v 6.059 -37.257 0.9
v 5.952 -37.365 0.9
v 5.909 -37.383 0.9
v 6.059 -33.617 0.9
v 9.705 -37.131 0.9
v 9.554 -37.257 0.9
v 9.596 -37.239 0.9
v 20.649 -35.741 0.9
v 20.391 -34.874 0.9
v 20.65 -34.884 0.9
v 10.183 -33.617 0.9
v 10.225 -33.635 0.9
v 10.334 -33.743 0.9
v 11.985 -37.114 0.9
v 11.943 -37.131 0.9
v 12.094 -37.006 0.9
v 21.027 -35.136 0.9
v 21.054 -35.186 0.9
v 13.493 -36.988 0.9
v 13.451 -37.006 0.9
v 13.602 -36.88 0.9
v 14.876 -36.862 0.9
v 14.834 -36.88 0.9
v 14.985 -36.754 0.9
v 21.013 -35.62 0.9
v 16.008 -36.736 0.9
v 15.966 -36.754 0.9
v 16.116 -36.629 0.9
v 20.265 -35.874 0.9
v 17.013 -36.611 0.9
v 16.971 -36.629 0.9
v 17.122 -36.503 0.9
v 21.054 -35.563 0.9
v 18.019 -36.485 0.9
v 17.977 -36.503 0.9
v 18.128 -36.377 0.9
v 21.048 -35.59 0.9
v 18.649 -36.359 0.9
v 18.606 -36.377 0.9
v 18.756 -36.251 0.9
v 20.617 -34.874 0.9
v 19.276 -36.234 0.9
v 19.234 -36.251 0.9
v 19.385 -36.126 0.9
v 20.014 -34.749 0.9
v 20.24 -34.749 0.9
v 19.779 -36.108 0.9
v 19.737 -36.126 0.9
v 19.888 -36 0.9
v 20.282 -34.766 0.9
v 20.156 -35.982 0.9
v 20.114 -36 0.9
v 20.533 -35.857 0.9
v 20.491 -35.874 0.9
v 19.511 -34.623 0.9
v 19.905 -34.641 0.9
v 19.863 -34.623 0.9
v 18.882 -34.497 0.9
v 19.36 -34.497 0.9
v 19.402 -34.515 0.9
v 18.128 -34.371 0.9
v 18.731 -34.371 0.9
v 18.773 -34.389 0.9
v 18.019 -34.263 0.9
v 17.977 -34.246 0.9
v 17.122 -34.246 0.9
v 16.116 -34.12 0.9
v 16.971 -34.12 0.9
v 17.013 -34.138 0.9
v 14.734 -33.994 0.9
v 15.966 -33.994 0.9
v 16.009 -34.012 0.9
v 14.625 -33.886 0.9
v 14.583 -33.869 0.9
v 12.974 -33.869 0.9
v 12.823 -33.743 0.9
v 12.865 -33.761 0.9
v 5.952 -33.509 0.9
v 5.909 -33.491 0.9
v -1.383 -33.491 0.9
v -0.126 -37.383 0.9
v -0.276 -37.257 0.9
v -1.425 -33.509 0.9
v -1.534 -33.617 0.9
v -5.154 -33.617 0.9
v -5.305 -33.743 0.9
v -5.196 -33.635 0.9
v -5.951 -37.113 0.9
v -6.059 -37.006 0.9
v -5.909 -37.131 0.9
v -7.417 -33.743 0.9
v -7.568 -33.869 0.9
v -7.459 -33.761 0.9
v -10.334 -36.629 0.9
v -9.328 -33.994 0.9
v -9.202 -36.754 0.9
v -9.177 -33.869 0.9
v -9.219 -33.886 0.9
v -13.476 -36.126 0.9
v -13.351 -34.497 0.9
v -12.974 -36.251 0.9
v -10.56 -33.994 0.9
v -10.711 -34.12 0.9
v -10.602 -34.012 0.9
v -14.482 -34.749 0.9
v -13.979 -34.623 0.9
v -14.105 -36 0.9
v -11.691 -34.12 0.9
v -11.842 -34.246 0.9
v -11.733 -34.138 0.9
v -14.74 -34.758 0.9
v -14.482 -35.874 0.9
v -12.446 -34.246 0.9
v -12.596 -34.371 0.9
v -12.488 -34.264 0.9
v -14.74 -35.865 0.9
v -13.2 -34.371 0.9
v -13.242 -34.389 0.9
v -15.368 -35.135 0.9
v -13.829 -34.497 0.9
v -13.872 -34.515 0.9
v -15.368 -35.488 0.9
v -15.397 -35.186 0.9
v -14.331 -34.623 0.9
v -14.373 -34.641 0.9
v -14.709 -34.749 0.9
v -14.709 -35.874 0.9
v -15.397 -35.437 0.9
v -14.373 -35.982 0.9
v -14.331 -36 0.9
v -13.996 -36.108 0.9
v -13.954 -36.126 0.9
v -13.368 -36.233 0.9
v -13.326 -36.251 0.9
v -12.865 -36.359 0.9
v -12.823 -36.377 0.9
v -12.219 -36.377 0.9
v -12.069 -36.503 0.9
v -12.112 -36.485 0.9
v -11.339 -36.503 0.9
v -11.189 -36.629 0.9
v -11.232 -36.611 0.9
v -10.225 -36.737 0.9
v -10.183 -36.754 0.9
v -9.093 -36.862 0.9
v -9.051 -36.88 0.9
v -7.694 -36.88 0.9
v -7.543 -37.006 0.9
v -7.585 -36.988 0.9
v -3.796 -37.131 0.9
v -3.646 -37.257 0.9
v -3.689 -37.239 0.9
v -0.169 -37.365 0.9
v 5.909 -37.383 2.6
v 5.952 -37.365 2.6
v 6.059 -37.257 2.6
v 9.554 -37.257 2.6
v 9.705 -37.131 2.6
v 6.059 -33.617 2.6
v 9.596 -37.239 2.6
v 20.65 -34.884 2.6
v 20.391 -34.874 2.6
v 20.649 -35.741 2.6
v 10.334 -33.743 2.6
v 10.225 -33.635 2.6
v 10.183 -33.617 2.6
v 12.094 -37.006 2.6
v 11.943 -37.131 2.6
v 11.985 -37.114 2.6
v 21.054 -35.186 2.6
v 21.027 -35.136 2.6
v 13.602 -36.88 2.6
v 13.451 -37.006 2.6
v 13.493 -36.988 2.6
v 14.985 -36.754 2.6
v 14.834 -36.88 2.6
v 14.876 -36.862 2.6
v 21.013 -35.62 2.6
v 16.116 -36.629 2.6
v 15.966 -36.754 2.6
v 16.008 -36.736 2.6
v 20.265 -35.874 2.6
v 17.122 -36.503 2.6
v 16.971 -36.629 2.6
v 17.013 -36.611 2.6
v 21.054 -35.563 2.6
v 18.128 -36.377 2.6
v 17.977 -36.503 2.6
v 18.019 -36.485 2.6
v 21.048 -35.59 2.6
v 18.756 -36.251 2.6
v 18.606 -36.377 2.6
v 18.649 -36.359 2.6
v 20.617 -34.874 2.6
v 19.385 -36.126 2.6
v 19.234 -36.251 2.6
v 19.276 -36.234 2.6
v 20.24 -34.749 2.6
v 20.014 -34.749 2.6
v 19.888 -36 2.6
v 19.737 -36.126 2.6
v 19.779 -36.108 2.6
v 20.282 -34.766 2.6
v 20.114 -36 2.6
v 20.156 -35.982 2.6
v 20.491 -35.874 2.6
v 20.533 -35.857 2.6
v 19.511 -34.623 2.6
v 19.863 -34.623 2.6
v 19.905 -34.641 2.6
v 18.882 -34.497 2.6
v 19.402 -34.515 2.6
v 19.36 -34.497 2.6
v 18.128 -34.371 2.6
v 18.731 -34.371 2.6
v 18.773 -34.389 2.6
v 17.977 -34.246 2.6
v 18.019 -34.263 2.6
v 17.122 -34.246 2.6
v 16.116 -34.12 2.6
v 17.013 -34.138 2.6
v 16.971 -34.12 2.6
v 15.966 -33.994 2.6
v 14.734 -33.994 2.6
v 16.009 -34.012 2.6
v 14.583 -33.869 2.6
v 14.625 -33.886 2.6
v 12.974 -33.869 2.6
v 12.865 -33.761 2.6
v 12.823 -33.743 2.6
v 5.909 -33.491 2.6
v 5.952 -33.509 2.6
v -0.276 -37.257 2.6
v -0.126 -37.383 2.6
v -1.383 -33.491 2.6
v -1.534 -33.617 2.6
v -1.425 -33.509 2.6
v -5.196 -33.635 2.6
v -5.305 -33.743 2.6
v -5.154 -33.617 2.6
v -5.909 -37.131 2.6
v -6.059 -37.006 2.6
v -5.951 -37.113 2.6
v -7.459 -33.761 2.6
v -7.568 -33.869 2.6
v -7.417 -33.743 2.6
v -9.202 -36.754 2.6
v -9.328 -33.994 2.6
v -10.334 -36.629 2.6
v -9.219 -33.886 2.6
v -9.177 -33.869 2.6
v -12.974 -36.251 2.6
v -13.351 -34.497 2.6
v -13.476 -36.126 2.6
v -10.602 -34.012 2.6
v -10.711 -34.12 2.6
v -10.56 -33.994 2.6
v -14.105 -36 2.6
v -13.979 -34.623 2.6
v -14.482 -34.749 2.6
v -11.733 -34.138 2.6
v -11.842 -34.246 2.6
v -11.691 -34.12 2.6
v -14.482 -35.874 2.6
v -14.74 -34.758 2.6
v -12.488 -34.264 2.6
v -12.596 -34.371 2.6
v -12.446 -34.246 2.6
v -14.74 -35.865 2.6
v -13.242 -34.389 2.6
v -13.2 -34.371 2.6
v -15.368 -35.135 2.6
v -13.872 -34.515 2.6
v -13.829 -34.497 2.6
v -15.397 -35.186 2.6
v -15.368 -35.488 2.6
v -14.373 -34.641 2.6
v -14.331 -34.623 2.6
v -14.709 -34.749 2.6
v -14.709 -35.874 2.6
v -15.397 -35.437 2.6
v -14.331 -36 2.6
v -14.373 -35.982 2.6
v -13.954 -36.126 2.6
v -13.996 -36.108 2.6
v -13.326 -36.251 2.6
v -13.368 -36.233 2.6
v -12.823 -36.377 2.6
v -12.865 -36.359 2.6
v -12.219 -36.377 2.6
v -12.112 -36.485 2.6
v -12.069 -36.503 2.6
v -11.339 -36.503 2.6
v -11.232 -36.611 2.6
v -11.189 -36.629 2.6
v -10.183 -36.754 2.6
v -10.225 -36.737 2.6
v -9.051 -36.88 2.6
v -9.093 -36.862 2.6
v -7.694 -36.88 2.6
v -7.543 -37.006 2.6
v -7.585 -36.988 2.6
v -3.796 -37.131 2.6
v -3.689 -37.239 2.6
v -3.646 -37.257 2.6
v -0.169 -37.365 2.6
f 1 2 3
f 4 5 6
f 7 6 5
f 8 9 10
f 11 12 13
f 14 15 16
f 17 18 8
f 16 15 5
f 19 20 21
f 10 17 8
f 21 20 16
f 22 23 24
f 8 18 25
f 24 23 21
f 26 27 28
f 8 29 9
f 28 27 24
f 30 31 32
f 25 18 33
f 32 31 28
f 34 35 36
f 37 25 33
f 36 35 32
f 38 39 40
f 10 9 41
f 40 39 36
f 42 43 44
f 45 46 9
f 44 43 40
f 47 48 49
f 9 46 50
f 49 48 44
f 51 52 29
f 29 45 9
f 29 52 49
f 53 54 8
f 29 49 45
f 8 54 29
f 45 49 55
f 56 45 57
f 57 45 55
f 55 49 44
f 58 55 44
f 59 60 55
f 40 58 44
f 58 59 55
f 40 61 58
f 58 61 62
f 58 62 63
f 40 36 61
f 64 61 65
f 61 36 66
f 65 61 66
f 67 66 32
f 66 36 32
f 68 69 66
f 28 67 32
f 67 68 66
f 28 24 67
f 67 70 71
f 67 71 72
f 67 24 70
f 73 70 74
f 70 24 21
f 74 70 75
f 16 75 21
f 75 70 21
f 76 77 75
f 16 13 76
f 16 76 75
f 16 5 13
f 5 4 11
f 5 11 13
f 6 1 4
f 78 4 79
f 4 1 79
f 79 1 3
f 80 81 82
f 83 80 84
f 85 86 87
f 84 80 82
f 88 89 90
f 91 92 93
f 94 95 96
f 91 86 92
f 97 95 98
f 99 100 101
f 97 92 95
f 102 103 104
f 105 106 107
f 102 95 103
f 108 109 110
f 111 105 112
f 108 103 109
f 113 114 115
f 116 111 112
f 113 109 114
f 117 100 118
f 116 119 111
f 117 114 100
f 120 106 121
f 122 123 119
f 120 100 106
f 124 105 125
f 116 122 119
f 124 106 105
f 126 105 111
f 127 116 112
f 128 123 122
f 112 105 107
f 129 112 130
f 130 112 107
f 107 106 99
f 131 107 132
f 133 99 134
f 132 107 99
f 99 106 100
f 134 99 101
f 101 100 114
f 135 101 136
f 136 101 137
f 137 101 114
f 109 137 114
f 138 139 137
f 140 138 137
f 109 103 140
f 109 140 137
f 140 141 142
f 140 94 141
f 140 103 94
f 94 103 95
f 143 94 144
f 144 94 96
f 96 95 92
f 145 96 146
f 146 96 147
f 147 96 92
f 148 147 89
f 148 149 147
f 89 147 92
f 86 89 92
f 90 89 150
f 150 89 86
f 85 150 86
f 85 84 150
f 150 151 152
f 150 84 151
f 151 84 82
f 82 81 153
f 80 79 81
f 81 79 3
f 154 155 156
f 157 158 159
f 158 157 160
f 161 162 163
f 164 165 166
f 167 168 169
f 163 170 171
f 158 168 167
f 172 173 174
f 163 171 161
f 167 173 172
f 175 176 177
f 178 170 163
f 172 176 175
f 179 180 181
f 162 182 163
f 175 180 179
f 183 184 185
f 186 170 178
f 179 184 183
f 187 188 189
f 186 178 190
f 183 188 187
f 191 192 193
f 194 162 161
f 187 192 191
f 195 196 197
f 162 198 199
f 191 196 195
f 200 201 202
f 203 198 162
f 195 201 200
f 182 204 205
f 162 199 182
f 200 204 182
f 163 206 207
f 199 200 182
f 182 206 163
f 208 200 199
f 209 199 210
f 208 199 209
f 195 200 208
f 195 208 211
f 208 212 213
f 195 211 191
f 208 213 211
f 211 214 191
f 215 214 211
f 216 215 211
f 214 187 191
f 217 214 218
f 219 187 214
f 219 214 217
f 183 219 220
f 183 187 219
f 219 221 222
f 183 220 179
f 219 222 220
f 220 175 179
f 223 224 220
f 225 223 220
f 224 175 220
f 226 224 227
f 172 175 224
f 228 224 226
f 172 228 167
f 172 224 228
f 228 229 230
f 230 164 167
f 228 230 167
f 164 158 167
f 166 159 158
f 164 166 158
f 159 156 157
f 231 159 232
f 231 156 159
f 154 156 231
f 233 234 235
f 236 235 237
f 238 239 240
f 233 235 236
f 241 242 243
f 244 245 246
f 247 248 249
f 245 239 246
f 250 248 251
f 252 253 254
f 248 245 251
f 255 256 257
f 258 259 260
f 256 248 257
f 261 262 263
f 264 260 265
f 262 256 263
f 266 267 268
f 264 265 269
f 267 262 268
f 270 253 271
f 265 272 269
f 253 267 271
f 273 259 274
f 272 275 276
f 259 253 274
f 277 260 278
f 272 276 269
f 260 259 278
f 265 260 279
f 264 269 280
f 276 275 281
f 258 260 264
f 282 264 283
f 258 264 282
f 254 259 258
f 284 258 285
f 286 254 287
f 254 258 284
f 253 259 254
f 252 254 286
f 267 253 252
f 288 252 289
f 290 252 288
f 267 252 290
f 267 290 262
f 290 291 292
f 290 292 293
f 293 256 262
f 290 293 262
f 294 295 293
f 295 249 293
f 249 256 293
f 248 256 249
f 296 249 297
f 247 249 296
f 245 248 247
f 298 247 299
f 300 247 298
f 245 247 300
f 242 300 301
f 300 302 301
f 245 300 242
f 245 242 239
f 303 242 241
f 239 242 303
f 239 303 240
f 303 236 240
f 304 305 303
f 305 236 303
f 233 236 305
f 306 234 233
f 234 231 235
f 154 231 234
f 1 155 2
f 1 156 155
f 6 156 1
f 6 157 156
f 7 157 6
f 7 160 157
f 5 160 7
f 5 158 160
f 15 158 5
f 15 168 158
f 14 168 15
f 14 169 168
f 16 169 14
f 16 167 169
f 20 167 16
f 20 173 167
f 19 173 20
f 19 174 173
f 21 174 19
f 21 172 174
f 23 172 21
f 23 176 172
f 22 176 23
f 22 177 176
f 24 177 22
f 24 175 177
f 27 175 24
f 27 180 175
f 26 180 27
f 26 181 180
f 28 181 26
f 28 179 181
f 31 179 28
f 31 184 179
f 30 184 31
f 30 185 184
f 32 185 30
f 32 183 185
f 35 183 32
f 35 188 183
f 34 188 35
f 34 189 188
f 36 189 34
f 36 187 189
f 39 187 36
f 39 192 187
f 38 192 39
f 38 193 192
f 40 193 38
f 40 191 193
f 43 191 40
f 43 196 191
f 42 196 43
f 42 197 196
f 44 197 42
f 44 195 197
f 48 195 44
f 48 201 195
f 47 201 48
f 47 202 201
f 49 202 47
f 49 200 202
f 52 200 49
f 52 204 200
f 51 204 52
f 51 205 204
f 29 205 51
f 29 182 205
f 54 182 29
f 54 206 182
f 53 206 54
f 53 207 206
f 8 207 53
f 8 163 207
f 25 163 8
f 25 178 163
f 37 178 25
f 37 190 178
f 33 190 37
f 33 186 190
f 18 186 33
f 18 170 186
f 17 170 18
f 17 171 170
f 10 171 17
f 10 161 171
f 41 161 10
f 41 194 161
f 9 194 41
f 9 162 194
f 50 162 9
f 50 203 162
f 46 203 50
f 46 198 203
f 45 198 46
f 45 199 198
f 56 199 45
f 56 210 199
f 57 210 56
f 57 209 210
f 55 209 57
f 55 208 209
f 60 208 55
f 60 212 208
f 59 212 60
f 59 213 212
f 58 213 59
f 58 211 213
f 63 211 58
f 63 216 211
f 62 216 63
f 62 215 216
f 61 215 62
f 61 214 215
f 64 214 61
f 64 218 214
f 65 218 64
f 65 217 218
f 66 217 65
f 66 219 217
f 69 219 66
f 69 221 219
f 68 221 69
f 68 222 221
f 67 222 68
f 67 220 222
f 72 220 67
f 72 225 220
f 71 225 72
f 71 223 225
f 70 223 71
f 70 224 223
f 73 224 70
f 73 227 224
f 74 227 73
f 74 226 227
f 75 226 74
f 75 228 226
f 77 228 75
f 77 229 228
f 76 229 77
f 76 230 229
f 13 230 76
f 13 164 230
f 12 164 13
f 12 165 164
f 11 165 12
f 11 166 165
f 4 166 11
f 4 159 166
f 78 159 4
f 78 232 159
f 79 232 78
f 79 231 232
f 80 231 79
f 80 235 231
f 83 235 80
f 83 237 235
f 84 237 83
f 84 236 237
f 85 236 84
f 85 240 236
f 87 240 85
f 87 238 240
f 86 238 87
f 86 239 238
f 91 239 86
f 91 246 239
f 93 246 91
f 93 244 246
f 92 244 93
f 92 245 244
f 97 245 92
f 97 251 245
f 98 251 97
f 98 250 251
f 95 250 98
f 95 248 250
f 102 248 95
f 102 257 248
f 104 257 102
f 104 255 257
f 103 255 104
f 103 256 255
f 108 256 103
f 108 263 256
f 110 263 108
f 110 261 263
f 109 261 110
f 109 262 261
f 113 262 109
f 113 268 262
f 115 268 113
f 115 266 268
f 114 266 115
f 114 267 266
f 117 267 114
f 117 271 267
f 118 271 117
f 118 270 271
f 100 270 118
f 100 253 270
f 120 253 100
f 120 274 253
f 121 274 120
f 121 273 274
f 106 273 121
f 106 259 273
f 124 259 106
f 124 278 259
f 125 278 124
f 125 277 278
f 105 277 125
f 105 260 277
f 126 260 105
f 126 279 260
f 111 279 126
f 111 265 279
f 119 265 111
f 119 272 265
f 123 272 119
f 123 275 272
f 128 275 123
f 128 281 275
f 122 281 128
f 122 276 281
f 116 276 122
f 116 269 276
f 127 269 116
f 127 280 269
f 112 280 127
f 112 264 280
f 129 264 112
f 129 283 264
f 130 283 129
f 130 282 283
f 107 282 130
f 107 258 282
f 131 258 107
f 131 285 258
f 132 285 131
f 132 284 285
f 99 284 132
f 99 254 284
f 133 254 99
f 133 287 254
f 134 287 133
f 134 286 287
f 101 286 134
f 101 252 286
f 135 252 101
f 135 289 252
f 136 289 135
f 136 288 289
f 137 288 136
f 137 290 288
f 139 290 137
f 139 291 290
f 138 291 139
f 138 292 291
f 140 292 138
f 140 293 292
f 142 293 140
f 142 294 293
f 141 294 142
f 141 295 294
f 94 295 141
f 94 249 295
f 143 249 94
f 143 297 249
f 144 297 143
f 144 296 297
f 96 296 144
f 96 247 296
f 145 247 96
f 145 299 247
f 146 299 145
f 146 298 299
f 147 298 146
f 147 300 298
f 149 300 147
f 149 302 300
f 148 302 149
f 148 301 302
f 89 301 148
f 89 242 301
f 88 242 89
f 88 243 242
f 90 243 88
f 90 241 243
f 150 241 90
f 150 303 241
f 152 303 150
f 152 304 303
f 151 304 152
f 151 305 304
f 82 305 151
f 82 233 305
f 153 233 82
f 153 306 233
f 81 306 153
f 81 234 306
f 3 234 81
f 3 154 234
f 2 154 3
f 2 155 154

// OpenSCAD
$fn = 24;
translate([0, -2.500, 0.900])
  linear_extrude(height=1.700) {
offset(r=0.06, $fn=8) {
    polygon(points=[[-15.337,-32.686],[-15.337,-32.937],[-14.709,-33.314],[-14.457,-33.314],[-14.331,-33.440],[-14.080,-33.440],[-13.954,-33.566],[-13.451,-33.566],[-13.326,-33.691],[-12.949,-33.691],[-12.823,-33.817],[-12.194,-33.817],[-12.069,-33.943],[-11.314,-33.943],[-11.189,-34.069],[-10.309,-34.069],[-10.183,-34.194],[-9.177,-34.194],[-9.051,-34.320],[-7.669,-34.320],[-7.543,-34.446],[-6.034,-34.446],[-5.909,-34.571],[-3.771,-34.571],[-3.646,-34.697],[-0.251,-34.697],[-0.126,-34.823],[5.909,-34.823],[6.034,-34.697],[9.554,-34.697],[9.680,-34.571],[11.943,-34.571],[12.069,-34.446],[13.451,-34.446],[13.577,-34.320],[14.834,-34.320],[14.960,-34.194],[15.966,-34.194],[16.091,-34.069],[16.971,-34.069],[17.097,-33.943],[17.977,-33.943],[18.103,-33.817],[18.606,-33.817],[18.731,-33.691],[19.234,-33.691],[19.360,-33.566],[19.737,-33.566],[19.863,-33.440],[20.114,-33.440],[20.240,-33.314],[20.491,-33.314],[20.617,-33.189],[20.994,-33.063],[20.994,-32.686],[20.617,-32.434],[20.366,-32.434],[20.240,-32.309],[19.989,-32.309],[19.863,-32.183],[19.486,-32.183],[19.360,-32.057],[18.857,-32.057],[18.731,-31.931],[18.103,-31.931],[17.977,-31.806],[17.097,-31.806],[16.971,-31.680],[16.091,-31.680],[15.966,-31.554],[14.709,-31.554],[14.583,-31.429],[12.949,-31.429],[12.823,-31.303],[10.309,-31.303],[10.183,-31.177],[6.034,-31.177],[5.909,-31.051],[-1.383,-31.051],[-1.509,-31.177],[-5.154,-31.177],[-5.280,-31.303],[-7.417,-31.303],[-7.543,-31.429],[-9.177,-31.429],[-9.303,-31.554],[-10.560,-31.554],[-10.686,-31.680],[-11.691,-31.680],[-11.817,-31.806],[-12.446,-31.806],[-12.571,-31.931],[-13.200,-31.931],[-13.326,-32.057],[-13.829,-32.057],[-13.954,-32.183],[-14.331,-32.183],[-14.457,-32.309],[-14.709,-32.309]], paths=[[0,1,2,3,4,5,6,7,8,9,10,11,12,13,14,15,16,17,18,19,20,21,22,23,24,25,26,27,28,29,30,31,32,33,34,35,36,37,38,39,40,41,42,43,44,45,46,47,48,49,50,51,52,53,54,55,56,57,58,59,60,61,62,63,64,65,66,67,68,69,70,71,72,73,74,75,76,77,78,79,80,81,82,83,84,85,86,87,88,89,90,91,92,93,94,95,96,97,98]]);
}
}
